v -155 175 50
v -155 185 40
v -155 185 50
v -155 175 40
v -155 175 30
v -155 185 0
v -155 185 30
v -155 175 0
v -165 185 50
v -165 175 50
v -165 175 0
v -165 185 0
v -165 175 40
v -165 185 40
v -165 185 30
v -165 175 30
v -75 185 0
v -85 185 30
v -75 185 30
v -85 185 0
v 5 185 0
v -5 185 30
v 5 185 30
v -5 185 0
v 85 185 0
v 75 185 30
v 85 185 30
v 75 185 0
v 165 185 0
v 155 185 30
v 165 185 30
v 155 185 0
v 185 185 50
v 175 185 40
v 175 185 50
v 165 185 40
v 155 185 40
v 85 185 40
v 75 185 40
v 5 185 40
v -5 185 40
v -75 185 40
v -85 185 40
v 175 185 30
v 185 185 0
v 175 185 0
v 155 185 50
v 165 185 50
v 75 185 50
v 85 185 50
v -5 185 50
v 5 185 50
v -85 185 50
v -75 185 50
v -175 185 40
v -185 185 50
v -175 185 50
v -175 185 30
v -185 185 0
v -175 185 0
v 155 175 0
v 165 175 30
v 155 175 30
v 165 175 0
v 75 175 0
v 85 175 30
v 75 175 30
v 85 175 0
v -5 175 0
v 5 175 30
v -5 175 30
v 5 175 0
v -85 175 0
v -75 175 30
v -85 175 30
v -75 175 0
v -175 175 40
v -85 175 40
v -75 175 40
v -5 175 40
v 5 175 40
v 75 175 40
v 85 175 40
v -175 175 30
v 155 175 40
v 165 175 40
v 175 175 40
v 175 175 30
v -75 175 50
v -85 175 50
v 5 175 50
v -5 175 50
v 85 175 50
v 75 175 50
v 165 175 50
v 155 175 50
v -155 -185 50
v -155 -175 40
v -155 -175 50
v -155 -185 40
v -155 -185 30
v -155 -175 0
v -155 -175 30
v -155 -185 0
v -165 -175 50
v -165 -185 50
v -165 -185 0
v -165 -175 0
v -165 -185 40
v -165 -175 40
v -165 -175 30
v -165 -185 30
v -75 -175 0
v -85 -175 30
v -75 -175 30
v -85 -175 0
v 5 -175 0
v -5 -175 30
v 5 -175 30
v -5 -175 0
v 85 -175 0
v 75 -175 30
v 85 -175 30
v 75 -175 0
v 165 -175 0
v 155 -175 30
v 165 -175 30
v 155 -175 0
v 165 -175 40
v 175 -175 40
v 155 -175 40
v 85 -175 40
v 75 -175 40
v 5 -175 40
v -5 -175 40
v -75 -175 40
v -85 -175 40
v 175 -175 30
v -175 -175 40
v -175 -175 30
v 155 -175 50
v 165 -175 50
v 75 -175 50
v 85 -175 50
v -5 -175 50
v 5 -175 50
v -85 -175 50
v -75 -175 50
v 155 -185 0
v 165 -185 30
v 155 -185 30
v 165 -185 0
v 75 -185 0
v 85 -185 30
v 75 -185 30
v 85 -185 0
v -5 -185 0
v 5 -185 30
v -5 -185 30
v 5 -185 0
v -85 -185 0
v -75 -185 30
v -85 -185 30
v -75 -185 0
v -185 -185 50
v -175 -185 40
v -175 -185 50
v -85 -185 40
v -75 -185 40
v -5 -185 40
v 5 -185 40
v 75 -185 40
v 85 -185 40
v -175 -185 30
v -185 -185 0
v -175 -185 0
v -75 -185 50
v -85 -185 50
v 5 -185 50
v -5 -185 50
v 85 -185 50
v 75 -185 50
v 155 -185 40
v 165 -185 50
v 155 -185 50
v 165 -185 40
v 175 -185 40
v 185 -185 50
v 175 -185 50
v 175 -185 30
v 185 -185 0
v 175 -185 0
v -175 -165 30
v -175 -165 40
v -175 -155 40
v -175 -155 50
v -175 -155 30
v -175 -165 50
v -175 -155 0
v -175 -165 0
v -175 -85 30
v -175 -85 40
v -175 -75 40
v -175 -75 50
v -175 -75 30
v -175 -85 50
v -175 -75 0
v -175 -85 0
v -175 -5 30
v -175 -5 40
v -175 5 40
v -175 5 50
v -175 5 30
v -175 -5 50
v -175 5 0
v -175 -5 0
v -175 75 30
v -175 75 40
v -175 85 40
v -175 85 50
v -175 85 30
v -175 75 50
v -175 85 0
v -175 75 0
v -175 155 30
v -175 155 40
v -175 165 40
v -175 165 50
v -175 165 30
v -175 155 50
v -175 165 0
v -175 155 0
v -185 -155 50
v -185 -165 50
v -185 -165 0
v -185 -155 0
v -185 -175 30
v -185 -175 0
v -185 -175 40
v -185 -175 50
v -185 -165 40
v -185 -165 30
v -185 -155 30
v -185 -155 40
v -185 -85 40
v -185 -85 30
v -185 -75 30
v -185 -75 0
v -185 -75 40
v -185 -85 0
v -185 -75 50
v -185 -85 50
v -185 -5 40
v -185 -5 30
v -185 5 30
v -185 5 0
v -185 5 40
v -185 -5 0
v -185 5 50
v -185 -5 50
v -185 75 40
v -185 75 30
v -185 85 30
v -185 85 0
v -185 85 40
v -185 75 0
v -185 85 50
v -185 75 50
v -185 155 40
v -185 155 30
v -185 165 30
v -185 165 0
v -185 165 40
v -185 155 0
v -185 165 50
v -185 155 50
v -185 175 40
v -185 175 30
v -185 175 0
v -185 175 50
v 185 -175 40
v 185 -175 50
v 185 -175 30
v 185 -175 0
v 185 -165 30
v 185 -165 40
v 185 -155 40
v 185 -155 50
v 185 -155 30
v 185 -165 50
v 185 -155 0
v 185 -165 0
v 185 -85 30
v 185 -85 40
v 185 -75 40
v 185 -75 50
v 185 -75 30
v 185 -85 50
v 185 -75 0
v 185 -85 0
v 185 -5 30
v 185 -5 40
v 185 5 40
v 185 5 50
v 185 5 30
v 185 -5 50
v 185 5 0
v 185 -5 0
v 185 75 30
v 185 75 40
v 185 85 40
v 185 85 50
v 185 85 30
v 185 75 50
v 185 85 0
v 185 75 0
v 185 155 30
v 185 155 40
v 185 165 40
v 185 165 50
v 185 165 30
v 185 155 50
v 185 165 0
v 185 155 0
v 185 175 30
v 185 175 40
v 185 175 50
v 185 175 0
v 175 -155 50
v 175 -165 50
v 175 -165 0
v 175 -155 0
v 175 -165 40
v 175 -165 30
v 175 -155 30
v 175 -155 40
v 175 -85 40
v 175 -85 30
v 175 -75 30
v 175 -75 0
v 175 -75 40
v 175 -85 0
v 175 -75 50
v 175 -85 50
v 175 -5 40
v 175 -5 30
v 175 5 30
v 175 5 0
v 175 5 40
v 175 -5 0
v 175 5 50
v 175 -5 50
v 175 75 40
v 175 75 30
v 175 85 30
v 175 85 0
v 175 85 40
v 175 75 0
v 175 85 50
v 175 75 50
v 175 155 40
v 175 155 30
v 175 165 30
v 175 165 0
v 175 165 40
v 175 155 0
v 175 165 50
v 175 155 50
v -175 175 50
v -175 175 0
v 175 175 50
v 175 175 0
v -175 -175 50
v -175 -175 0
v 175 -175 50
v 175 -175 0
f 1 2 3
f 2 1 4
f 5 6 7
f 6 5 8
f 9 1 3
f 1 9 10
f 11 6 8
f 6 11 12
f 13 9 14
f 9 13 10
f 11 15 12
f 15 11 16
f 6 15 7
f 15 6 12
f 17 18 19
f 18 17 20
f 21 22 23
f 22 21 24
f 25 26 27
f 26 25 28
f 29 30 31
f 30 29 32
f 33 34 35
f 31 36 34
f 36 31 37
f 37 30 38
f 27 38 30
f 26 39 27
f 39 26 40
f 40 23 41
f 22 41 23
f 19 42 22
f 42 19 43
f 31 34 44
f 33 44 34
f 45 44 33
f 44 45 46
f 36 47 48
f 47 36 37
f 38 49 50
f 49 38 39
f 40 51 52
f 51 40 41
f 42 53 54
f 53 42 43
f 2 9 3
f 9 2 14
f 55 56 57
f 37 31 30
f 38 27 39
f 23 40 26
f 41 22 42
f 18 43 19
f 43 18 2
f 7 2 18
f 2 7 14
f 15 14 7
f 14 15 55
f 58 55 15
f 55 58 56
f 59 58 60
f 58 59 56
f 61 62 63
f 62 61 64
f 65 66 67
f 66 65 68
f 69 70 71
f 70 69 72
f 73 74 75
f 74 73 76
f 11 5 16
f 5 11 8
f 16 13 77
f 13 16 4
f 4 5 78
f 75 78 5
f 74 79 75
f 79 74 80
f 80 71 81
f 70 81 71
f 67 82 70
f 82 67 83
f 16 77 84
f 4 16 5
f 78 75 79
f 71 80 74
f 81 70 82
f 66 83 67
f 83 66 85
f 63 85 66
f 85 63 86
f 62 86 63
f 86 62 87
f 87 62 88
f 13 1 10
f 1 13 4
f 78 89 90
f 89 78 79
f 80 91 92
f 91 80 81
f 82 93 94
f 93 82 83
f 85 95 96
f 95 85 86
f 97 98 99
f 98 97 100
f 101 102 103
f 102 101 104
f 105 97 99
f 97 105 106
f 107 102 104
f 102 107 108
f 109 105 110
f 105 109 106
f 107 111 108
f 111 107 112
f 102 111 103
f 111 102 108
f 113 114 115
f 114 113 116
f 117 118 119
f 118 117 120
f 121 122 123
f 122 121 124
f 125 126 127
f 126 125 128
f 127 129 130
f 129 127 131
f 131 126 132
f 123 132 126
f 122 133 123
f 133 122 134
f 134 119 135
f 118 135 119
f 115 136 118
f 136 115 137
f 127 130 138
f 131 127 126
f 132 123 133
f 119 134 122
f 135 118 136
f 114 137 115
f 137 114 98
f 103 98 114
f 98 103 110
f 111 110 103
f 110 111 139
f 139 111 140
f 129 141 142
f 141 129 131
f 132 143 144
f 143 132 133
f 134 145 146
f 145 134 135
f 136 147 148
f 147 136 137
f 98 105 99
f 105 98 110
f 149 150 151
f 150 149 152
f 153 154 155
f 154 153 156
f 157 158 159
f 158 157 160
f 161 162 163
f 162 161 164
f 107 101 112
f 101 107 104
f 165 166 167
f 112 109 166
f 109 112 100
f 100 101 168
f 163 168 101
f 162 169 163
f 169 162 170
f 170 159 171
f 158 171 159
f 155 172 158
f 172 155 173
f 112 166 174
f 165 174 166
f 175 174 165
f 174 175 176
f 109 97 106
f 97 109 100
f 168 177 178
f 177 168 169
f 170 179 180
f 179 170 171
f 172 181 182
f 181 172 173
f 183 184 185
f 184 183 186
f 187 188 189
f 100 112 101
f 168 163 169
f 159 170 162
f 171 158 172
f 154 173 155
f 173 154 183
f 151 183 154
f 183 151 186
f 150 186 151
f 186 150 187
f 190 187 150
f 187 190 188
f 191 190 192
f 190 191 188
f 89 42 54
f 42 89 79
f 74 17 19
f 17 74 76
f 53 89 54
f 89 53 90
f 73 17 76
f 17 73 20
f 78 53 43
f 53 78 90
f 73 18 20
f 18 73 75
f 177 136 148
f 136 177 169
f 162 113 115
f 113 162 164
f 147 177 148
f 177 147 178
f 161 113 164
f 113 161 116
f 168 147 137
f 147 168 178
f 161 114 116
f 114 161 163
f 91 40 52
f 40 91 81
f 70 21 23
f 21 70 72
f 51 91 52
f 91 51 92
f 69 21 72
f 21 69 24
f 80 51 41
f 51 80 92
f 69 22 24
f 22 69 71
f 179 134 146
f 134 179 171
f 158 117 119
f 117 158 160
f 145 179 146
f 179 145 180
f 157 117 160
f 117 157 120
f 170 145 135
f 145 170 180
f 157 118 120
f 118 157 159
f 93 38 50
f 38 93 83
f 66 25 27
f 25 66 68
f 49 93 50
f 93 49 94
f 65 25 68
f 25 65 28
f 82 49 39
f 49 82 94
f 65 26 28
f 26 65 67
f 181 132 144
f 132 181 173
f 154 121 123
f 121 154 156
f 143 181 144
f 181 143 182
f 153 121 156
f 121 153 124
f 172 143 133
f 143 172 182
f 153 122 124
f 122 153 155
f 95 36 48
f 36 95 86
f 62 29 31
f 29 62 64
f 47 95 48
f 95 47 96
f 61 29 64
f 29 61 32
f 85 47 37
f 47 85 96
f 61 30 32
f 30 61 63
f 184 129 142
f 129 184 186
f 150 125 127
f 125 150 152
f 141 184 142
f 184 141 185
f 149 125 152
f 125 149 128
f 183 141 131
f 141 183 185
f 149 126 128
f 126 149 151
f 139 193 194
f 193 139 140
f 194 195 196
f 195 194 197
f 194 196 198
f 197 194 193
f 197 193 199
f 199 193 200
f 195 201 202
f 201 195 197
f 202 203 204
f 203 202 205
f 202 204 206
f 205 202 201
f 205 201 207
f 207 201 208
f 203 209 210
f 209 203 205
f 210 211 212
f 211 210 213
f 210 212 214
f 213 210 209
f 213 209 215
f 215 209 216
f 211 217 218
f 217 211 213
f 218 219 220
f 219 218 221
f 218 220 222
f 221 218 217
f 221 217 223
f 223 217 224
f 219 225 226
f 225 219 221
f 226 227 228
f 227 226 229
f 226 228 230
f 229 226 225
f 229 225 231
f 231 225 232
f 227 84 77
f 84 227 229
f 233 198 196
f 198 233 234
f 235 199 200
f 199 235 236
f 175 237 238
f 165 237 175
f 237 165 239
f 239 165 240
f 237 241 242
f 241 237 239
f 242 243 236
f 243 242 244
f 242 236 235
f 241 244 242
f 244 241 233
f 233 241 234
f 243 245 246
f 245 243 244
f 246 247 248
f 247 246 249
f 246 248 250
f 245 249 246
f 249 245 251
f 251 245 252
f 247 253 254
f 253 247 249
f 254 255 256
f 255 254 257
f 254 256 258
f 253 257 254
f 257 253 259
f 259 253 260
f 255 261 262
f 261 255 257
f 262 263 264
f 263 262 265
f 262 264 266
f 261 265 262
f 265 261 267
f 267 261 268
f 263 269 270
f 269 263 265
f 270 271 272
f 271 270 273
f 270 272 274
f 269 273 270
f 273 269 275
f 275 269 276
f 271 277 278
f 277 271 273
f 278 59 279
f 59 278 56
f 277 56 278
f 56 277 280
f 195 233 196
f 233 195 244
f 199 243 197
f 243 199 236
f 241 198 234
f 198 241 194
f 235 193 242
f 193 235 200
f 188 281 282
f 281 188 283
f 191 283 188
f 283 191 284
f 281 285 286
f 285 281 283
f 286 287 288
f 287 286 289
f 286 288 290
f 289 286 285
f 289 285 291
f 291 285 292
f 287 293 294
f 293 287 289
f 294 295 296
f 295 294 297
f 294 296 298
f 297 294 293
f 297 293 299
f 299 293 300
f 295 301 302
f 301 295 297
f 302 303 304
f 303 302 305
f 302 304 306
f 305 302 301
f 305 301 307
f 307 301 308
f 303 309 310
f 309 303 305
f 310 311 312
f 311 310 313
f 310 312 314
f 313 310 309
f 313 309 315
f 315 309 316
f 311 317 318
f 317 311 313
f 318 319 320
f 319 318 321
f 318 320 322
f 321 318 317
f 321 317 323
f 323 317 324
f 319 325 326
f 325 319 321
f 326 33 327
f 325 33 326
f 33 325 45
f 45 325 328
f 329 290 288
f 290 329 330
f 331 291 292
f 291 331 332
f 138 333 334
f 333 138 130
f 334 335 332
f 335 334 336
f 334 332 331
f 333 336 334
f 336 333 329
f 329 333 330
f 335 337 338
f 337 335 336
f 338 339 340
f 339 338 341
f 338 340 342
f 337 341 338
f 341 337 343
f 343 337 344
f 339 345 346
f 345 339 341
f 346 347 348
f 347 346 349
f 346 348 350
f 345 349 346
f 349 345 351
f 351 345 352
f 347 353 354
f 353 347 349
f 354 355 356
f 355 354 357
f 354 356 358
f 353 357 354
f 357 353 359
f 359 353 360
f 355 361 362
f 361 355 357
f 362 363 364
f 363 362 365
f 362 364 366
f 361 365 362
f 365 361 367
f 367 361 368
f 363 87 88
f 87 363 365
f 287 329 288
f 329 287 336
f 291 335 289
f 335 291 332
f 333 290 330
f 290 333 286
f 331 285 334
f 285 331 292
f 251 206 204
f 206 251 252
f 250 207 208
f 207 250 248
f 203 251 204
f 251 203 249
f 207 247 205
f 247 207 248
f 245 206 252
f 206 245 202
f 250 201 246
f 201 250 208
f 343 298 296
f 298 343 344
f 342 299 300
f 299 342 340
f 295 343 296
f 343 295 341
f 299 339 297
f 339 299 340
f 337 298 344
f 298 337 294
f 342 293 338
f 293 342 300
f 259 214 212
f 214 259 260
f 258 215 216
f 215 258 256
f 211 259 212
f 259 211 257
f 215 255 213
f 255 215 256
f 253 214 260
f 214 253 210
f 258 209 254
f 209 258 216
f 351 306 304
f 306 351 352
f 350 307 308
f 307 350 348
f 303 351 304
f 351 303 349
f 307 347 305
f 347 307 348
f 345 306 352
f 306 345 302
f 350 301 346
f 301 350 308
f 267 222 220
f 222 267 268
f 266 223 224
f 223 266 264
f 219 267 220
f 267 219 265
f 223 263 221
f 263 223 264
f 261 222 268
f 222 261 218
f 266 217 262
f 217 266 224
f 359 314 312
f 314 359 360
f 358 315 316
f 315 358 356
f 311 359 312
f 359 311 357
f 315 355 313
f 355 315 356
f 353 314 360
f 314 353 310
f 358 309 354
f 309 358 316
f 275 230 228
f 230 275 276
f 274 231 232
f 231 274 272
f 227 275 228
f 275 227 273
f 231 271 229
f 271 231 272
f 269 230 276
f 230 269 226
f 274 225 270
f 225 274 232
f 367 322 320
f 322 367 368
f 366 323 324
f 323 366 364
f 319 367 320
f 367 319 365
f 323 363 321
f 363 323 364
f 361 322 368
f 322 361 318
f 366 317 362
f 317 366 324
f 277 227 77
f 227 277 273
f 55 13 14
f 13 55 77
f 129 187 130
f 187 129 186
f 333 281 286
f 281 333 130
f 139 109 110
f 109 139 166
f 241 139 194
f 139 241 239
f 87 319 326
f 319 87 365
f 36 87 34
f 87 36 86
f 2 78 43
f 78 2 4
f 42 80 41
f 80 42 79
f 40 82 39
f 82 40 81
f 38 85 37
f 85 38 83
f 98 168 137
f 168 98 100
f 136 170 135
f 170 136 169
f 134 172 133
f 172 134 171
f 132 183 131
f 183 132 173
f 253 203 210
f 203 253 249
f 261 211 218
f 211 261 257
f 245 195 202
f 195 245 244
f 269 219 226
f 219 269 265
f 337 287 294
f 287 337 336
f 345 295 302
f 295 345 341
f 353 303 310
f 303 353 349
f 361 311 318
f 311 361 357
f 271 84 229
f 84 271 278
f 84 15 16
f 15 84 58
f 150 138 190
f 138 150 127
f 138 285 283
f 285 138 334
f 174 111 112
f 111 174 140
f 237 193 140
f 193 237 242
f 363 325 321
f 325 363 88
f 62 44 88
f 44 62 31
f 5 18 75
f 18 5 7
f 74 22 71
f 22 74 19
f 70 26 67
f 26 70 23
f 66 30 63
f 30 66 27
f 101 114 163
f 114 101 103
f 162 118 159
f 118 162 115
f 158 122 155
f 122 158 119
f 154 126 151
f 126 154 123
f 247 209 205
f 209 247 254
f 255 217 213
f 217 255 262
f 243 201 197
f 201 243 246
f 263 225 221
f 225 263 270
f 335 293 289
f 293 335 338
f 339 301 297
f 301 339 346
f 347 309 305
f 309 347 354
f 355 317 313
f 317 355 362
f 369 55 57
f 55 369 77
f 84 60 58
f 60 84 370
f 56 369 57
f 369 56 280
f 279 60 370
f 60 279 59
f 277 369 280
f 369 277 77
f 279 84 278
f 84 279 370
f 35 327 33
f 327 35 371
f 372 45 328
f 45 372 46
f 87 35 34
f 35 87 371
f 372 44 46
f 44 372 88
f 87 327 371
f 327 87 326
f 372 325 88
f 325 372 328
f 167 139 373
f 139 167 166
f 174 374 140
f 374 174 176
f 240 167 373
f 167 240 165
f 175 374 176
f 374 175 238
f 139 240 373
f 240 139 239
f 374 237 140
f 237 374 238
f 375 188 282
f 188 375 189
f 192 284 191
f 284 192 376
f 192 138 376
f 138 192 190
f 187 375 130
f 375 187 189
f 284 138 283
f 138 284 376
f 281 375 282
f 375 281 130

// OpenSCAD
// Cage slice 9
// Internal cavity: 350 x 350 x 700 mm
// Bar thickness: 10 mm (square)
// Gap between bars: 70 mm (uniform)
// Slice index: 9, slice Z range: [450, 500] (local coordinates 0..50)
// This file places the slice with its bottom on Z=0; when assembling, translate in Z by 450 mm.
// Export to STL with OpenSCAD: Render -> Export as STL.

bar = 10;
gap = 70;
s = bar + gap;
$fn = 64;  // cylinder resolution

x_centers = [-160, -80, 0, 80, 160];
y_centers = [-160, -80, 0, 80, 160];
z_centers = [5, 85, 165, 245, 325, 405, 485, 565, 645];

slice_index = 9;
slice_h = 50;

front_y = 180;
back_y = -180;
left_x = -180;
right_x = 180;
panel_length = 370;

hole_diam = 6.6;

module slice() {
    union() {
        // vertical bars on front and back (along Z)
        for (x = x_centers) {
            translate([x, front_y, slice_h/2]) cube([bar, bar, slice_h], center=true);
            translate([x, back_y, slice_h/2])  cube([bar, bar, slice_h], center=true);
        }
        // vertical bars on left and right (along Z)
        for (y = y_centers) {
            translate([left_x, y, slice_h/2])  cube([bar, bar, slice_h], center=true);
            translate([right_x, y, slice_h/2]) cube([bar, bar, slice_h], center=true);
        }
        // explicit corner vertical bars (ensure 4 corners for M6 rods)
        translate([-180, 180, slice_h/2]) cube([bar, bar, slice_h], center=true);
        translate([180, 180, slice_h/2]) cube([bar, bar, slice_h], center=true);
        translate([-180, -180, slice_h/2]) cube([bar, bar, slice_h], center=true);
        translate([180, -180, slice_h/2]) cube([bar, bar, slice_h], center=true);

        // horizontal bars (10 mm thick in Z) that lie inside this slice
        for (zc = z_centers) {
            z_local = zc - slice_index*slice_h;
            // include this horizontal bar if its center lies within this slice and it fits entirely here
            if (z_local >= bar/2 && z_local <= slice_h - bar/2) {
                // front and back horizontal bars (run along X)
                translate([0, front_y, z_local]) cube([panel_length, bar, bar], center=true);
                translate([0, back_y,  z_local]) cube([panel_length, bar, bar], center=true);
                // left and right horizontal bars (run along Y)
                translate([left_x, 0, z_local]) cube([bar, panel_length, bar], center=true);
                translate([right_x,0, z_local]) cube([bar, panel_length, bar], center=true);
            }
        }
    }
}

difference() {
    slice();
    // four vertical holes for M6 rods through corner bars (slightly longer than slice to ensure clean subtraction)
    translate([-180, 180, slice_h/2]) rotate([0,0,0]) cylinder(h = slice_h*4, r = hole_diam/2, center=true);
    translate([180, 180, slice_h/2]) rotate([0,0,0]) cylinder(h = slice_h*4, r = hole_diam/2, center=true);
    translate([-180, -180, slice_h/2]) rotate([0,0,0]) cylinder(h = slice_h*4, r = hole_diam/2, center=true);
    translate([180, -180, slice_h/2]) rotate([0,0,0]) cylinder(h = slice_h*4, r = hole_diam/2, center=true);
}

slice();
